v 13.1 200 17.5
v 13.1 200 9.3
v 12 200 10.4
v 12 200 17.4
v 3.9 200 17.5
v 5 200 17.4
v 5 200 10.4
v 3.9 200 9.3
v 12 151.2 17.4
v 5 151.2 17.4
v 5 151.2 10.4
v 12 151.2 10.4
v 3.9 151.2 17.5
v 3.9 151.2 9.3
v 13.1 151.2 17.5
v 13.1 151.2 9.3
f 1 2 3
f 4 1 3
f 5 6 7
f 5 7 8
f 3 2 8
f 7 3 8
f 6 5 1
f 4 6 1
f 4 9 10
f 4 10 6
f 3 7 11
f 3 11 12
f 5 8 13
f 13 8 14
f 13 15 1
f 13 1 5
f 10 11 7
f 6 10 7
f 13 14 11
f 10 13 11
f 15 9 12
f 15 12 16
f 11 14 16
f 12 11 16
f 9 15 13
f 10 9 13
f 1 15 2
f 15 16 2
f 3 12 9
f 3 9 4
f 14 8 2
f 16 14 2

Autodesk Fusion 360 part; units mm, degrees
sketch "Sketch1" plane through (0, 0, 0) normal (0, 0, 1) x (1, 0, 0)
  line L0 (0, 0) -> (17, 0)
  line L1 (17, 0) -> (17, 200)
  line L2 (17, 200) -> (0, 200)
  line L3 (0, 200) -> (0, 0)
  line L4 (5, 0) -> (5, 200)
  line L5 (12, 0) -> (12, 200)
  dimension "d1" = 17
  dimension "d2" = 200
  dimension "d3" = 200
  dimension "d4" = 7
  dimension "d5" = 200
extrude "Extrude1" add sketch "Sketch1" along normal blind 5
sketch "Sketch2" plane through (0, 0, 5) normal (0, 0, 1) x (-1, 0, 0)
  line L0 (0, -200) -> (0, 0)
  line L1 (0, 0) -> (-17, 0)
  line L2 (-17, 0) -> (-17, -200)
  line L3 (-17, -200) -> (0, -200)
  line L4 (-5, 0) -> (-5, -200)
  line L5 (-12, 0) -> (-12, -200)
  dimension "d8" = 5
  dimension "d9" = 7
  dimension "d10" = 200
  dimension "d11" = 200
extrude "Extrude2" add sketch "Sketch2" along normal blind 12 contours L0 L1 L3 L4 | L1 L2 L3 L5
sketch "Sketch3" plane through (12, 0, 0) normal (-1, 0, 0) x (0, -1, 0)
  line L0 (-200, 5) -> (0, 5)
  line L1 (0, 5) -> (0, 17)
  line L2 (0, 17) -> (-200, 17)
  line L3 (-200, 17) -> (-200, 5)
  line L4 (0, 17) -> (0, 12)
  line L5 (0, 12) -> (-200, 12)
  dimension "d14" = 200
extrude "Extrude3" add sketch "Sketch3" along normal blind 7 contours L1 L2 L3 L4 L5
move_face "OffsetFaces1" offset -0.5 4 faces at (12, 133.3333, 9.6667) (9.6667, 66.6667, 12) (5, 133.3333, 9.6667) (7.3333, 133.3333, 5)
sketch "Sketch4" plane through (0, 0, 17) normal (0, 0, 1) x (-1, 0, 0)
  line L0 (-17, -200) -> (0, -200)
  line L1 (0, -200) -> (0, 0)
  line L2 (0, 0) -> (-17, 0)
  line L3 (-17, 0) -> (-17, -200)
  line L4 (25, 0) -> (25, -200)
  line L5 (-42, 0) -> (-42, -200)
  line L6 (25, -200) -> (-42, -200)
  line L7 (25, 0) -> (-42, 0)
  dimension "d18" = 25
  dimension "d19" = 25
extrude "Extrude4" add sketch "Sketch4" along normal blind 2.5
move_face "OffsetFaces2" offset -3 3 faces at (17, 133.3333, 11.3333) (5.6667, 133.3333, 0) (0, 133.3333, 5.6667)
move_face "MoveFace1" by (0, 0, 3) 4 faces at (9.8333, 66.6667, 12.5) (4.5, 133.3333, 9.8333) (7.1667, 133.3333, 4.5) (12.5, 133.3333, 9.8333)
extrude "Extrude5" cut 1 faces at (6.6667, 133.3333, 3) along direction (0, 0, 1) blind 3
extrude "Extrude6" cut 1 faces at (19.6667, 133.3333, 19.5) along direction (0, 0, -1) blind 1
move_face "OffsetFaces3" offset 0.5 4 faces at (12.5, 133.3333, 12.8333) (7.1667, 133.3333, 7.5) (9.8333, 66.6667, 15.5) (4.5, 133.3333, 12.8333)
move_face "OffsetFaces4" offset 1 4 faces at (5, 133.3333, 12.6667) (7.3333, 133.3333, 8) (12, 133.3333, 12.6667) (7.3333, 66.6667, 15)
move_face "OffsetFaces5" offset -0.5 4 faces at (11, 133.3333, 12.3333) (9.3333, 66.6667, 14) (6, 133.3333, 12.3333) (7.6667, 133.3333, 9)
move_face "OffsetFaces6" offset -0.5 3 faces at (14, 66.6667, 9.6667) (6.6667, 133.3333, 6) (3, 66.6667, 13.3333)
move_face "OffsetFaces7" offset -0.5 3 faces at (13.5, 66.6667, 10) (6.8333, 133.3333, 6.5) (3.5, 66.6667, 13.5)
move_face "OffsetFaces8" offset -0.5 3 faces at (13, 66.6667, 10.3333) (7, 133.3333, 7) (4, 66.6667, 13.6667)
move_face "MoveFace2" by (0, 0, 3) 4 faces at (11.5, 133.3333, 12.5) (7.5, 66.6667, 14.5) (7.5, 133.3333, 8.5) (5.5, 133.3333, 12.5)
move_face "OffsetFaces9" offset -3 1 faces at (7.1667, 133.3333, 7.5)
move_face "OffsetFaces10" offset -0.5 2 faces at (32.1667, 133.3333, 17) (-5.3333, 66.6667, 17)
extrude "Extrude7" add 1 faces at (7.1667, 133.3333, 10.5) along direction (0, 0, -1) blind 0.5
move_face "MoveFace3" by (0, 0, -0.5) 4 faces at (11.5, 66.6667, 13.5) (7.5, 66.6667, 17.5) (5.5, 66.6667, 13.5) (7.5, 133.3333, 11.5)
move_face "OffsetFaces11" offset -4.5 1 faces at (42, 66.6667, 17.8333)
move_face "OffsetFaces12" offset -4.5 1 faces at (-25, 66.6667, 17.8333)
move_face "OffsetFaces13" offset 50 1 faces at (7.1667, 0, 18.1667)
move_face "OffsetFaces14" offset -0.5 4 faces at (11.5, 116.6667, 15) (7.5, 116.6667, 11) (5.5, 116.6667, 15) (9.5, 33.3333, 17)
move_face "OffsetFaces15" offset 0.5 3 faces at (12.5, 33.3333, 12.5) (7.1667, 116.6667, 10) (4.5, 116.6667, 15)
move_face "OffsetFaces16" offset 0.5 1 faces at (10, 33.3333, 9.5)
move_face "MoveFace4" by (0, 0, -0.5) 4 faces at (12, 33.3333, 15.1667) (9.6667, 33.3333, 10.5) (5, 33.3333, 15.1667) (7.3333, 116.6667, 17.5)
move_face "OffsetFaces17" offset 0.5 4 faces at (12, 33.3333, 14.6667) (7.3333, 116.6667, 17) (5, 33.3333, 14.6667) (9.6667, 33.3333, 10)
move_face "MoveFace5" by (0, 0, 0.5) 4 faces at (5.5, 116.6667, 14.5) (7.5, 116.6667, 10.5) (11.5, 116.6667, 14.5) (9.5, 33.3333, 16.5)
move_face "OffsetFaces18" offset -0.5 1 faces at (10, 33.3333, 9)
move_face "OffsetFaces19" offset -0.02 1 faces at (7.5, 116.6667, 11)
move_face "OffsetFaces20" offset -0.2 2 faces at (11.5, 116.6667, 14.9933) (5.5, 116.6667, 14.9933)
move_face "OffsetFaces21" offset -0.18 2 faces at (9.5667, 33.3333, 17) (7.4333, 116.6667, 10.98)
move_face "OffsetFaces22" offset 0.18 1 faces at (9.5667, 33.3333, 17.18)
move_face "OffsetFaces23" offset 0.1 2 faces at (11.7, 33.3333, 12.8667) (5.3, 33.3333, 12.8667)
move_face "OffsetFaces24" offset 0.1 2 faces at (13, 116.6667, 14.8333) (4, 33.3333, 12.1667)
move_face "OffsetFaces25" offset 0.2 1 faces at (6.9667, 116.6667, 9.5)
move_face "OffsetFaces26" offset -1 1 faces at (18.1667, 116.6667, 18.5)
move_face "OffsetFaces27" offset -202.2 1 faces at (7.4667, -50, 9.8)
move_face "OffsetFaces28" offset 1 1 faces at (7.4667, 152.2, 9.8)
move_face "OffsetFaces29" offset -0.4 4 faces at (11.6, 167.4667, 12.8667) (9.5333, 183.7333, 17) (5.4, 167.4667, 12.8667) (7.4667, 183.7333, 10.8)
